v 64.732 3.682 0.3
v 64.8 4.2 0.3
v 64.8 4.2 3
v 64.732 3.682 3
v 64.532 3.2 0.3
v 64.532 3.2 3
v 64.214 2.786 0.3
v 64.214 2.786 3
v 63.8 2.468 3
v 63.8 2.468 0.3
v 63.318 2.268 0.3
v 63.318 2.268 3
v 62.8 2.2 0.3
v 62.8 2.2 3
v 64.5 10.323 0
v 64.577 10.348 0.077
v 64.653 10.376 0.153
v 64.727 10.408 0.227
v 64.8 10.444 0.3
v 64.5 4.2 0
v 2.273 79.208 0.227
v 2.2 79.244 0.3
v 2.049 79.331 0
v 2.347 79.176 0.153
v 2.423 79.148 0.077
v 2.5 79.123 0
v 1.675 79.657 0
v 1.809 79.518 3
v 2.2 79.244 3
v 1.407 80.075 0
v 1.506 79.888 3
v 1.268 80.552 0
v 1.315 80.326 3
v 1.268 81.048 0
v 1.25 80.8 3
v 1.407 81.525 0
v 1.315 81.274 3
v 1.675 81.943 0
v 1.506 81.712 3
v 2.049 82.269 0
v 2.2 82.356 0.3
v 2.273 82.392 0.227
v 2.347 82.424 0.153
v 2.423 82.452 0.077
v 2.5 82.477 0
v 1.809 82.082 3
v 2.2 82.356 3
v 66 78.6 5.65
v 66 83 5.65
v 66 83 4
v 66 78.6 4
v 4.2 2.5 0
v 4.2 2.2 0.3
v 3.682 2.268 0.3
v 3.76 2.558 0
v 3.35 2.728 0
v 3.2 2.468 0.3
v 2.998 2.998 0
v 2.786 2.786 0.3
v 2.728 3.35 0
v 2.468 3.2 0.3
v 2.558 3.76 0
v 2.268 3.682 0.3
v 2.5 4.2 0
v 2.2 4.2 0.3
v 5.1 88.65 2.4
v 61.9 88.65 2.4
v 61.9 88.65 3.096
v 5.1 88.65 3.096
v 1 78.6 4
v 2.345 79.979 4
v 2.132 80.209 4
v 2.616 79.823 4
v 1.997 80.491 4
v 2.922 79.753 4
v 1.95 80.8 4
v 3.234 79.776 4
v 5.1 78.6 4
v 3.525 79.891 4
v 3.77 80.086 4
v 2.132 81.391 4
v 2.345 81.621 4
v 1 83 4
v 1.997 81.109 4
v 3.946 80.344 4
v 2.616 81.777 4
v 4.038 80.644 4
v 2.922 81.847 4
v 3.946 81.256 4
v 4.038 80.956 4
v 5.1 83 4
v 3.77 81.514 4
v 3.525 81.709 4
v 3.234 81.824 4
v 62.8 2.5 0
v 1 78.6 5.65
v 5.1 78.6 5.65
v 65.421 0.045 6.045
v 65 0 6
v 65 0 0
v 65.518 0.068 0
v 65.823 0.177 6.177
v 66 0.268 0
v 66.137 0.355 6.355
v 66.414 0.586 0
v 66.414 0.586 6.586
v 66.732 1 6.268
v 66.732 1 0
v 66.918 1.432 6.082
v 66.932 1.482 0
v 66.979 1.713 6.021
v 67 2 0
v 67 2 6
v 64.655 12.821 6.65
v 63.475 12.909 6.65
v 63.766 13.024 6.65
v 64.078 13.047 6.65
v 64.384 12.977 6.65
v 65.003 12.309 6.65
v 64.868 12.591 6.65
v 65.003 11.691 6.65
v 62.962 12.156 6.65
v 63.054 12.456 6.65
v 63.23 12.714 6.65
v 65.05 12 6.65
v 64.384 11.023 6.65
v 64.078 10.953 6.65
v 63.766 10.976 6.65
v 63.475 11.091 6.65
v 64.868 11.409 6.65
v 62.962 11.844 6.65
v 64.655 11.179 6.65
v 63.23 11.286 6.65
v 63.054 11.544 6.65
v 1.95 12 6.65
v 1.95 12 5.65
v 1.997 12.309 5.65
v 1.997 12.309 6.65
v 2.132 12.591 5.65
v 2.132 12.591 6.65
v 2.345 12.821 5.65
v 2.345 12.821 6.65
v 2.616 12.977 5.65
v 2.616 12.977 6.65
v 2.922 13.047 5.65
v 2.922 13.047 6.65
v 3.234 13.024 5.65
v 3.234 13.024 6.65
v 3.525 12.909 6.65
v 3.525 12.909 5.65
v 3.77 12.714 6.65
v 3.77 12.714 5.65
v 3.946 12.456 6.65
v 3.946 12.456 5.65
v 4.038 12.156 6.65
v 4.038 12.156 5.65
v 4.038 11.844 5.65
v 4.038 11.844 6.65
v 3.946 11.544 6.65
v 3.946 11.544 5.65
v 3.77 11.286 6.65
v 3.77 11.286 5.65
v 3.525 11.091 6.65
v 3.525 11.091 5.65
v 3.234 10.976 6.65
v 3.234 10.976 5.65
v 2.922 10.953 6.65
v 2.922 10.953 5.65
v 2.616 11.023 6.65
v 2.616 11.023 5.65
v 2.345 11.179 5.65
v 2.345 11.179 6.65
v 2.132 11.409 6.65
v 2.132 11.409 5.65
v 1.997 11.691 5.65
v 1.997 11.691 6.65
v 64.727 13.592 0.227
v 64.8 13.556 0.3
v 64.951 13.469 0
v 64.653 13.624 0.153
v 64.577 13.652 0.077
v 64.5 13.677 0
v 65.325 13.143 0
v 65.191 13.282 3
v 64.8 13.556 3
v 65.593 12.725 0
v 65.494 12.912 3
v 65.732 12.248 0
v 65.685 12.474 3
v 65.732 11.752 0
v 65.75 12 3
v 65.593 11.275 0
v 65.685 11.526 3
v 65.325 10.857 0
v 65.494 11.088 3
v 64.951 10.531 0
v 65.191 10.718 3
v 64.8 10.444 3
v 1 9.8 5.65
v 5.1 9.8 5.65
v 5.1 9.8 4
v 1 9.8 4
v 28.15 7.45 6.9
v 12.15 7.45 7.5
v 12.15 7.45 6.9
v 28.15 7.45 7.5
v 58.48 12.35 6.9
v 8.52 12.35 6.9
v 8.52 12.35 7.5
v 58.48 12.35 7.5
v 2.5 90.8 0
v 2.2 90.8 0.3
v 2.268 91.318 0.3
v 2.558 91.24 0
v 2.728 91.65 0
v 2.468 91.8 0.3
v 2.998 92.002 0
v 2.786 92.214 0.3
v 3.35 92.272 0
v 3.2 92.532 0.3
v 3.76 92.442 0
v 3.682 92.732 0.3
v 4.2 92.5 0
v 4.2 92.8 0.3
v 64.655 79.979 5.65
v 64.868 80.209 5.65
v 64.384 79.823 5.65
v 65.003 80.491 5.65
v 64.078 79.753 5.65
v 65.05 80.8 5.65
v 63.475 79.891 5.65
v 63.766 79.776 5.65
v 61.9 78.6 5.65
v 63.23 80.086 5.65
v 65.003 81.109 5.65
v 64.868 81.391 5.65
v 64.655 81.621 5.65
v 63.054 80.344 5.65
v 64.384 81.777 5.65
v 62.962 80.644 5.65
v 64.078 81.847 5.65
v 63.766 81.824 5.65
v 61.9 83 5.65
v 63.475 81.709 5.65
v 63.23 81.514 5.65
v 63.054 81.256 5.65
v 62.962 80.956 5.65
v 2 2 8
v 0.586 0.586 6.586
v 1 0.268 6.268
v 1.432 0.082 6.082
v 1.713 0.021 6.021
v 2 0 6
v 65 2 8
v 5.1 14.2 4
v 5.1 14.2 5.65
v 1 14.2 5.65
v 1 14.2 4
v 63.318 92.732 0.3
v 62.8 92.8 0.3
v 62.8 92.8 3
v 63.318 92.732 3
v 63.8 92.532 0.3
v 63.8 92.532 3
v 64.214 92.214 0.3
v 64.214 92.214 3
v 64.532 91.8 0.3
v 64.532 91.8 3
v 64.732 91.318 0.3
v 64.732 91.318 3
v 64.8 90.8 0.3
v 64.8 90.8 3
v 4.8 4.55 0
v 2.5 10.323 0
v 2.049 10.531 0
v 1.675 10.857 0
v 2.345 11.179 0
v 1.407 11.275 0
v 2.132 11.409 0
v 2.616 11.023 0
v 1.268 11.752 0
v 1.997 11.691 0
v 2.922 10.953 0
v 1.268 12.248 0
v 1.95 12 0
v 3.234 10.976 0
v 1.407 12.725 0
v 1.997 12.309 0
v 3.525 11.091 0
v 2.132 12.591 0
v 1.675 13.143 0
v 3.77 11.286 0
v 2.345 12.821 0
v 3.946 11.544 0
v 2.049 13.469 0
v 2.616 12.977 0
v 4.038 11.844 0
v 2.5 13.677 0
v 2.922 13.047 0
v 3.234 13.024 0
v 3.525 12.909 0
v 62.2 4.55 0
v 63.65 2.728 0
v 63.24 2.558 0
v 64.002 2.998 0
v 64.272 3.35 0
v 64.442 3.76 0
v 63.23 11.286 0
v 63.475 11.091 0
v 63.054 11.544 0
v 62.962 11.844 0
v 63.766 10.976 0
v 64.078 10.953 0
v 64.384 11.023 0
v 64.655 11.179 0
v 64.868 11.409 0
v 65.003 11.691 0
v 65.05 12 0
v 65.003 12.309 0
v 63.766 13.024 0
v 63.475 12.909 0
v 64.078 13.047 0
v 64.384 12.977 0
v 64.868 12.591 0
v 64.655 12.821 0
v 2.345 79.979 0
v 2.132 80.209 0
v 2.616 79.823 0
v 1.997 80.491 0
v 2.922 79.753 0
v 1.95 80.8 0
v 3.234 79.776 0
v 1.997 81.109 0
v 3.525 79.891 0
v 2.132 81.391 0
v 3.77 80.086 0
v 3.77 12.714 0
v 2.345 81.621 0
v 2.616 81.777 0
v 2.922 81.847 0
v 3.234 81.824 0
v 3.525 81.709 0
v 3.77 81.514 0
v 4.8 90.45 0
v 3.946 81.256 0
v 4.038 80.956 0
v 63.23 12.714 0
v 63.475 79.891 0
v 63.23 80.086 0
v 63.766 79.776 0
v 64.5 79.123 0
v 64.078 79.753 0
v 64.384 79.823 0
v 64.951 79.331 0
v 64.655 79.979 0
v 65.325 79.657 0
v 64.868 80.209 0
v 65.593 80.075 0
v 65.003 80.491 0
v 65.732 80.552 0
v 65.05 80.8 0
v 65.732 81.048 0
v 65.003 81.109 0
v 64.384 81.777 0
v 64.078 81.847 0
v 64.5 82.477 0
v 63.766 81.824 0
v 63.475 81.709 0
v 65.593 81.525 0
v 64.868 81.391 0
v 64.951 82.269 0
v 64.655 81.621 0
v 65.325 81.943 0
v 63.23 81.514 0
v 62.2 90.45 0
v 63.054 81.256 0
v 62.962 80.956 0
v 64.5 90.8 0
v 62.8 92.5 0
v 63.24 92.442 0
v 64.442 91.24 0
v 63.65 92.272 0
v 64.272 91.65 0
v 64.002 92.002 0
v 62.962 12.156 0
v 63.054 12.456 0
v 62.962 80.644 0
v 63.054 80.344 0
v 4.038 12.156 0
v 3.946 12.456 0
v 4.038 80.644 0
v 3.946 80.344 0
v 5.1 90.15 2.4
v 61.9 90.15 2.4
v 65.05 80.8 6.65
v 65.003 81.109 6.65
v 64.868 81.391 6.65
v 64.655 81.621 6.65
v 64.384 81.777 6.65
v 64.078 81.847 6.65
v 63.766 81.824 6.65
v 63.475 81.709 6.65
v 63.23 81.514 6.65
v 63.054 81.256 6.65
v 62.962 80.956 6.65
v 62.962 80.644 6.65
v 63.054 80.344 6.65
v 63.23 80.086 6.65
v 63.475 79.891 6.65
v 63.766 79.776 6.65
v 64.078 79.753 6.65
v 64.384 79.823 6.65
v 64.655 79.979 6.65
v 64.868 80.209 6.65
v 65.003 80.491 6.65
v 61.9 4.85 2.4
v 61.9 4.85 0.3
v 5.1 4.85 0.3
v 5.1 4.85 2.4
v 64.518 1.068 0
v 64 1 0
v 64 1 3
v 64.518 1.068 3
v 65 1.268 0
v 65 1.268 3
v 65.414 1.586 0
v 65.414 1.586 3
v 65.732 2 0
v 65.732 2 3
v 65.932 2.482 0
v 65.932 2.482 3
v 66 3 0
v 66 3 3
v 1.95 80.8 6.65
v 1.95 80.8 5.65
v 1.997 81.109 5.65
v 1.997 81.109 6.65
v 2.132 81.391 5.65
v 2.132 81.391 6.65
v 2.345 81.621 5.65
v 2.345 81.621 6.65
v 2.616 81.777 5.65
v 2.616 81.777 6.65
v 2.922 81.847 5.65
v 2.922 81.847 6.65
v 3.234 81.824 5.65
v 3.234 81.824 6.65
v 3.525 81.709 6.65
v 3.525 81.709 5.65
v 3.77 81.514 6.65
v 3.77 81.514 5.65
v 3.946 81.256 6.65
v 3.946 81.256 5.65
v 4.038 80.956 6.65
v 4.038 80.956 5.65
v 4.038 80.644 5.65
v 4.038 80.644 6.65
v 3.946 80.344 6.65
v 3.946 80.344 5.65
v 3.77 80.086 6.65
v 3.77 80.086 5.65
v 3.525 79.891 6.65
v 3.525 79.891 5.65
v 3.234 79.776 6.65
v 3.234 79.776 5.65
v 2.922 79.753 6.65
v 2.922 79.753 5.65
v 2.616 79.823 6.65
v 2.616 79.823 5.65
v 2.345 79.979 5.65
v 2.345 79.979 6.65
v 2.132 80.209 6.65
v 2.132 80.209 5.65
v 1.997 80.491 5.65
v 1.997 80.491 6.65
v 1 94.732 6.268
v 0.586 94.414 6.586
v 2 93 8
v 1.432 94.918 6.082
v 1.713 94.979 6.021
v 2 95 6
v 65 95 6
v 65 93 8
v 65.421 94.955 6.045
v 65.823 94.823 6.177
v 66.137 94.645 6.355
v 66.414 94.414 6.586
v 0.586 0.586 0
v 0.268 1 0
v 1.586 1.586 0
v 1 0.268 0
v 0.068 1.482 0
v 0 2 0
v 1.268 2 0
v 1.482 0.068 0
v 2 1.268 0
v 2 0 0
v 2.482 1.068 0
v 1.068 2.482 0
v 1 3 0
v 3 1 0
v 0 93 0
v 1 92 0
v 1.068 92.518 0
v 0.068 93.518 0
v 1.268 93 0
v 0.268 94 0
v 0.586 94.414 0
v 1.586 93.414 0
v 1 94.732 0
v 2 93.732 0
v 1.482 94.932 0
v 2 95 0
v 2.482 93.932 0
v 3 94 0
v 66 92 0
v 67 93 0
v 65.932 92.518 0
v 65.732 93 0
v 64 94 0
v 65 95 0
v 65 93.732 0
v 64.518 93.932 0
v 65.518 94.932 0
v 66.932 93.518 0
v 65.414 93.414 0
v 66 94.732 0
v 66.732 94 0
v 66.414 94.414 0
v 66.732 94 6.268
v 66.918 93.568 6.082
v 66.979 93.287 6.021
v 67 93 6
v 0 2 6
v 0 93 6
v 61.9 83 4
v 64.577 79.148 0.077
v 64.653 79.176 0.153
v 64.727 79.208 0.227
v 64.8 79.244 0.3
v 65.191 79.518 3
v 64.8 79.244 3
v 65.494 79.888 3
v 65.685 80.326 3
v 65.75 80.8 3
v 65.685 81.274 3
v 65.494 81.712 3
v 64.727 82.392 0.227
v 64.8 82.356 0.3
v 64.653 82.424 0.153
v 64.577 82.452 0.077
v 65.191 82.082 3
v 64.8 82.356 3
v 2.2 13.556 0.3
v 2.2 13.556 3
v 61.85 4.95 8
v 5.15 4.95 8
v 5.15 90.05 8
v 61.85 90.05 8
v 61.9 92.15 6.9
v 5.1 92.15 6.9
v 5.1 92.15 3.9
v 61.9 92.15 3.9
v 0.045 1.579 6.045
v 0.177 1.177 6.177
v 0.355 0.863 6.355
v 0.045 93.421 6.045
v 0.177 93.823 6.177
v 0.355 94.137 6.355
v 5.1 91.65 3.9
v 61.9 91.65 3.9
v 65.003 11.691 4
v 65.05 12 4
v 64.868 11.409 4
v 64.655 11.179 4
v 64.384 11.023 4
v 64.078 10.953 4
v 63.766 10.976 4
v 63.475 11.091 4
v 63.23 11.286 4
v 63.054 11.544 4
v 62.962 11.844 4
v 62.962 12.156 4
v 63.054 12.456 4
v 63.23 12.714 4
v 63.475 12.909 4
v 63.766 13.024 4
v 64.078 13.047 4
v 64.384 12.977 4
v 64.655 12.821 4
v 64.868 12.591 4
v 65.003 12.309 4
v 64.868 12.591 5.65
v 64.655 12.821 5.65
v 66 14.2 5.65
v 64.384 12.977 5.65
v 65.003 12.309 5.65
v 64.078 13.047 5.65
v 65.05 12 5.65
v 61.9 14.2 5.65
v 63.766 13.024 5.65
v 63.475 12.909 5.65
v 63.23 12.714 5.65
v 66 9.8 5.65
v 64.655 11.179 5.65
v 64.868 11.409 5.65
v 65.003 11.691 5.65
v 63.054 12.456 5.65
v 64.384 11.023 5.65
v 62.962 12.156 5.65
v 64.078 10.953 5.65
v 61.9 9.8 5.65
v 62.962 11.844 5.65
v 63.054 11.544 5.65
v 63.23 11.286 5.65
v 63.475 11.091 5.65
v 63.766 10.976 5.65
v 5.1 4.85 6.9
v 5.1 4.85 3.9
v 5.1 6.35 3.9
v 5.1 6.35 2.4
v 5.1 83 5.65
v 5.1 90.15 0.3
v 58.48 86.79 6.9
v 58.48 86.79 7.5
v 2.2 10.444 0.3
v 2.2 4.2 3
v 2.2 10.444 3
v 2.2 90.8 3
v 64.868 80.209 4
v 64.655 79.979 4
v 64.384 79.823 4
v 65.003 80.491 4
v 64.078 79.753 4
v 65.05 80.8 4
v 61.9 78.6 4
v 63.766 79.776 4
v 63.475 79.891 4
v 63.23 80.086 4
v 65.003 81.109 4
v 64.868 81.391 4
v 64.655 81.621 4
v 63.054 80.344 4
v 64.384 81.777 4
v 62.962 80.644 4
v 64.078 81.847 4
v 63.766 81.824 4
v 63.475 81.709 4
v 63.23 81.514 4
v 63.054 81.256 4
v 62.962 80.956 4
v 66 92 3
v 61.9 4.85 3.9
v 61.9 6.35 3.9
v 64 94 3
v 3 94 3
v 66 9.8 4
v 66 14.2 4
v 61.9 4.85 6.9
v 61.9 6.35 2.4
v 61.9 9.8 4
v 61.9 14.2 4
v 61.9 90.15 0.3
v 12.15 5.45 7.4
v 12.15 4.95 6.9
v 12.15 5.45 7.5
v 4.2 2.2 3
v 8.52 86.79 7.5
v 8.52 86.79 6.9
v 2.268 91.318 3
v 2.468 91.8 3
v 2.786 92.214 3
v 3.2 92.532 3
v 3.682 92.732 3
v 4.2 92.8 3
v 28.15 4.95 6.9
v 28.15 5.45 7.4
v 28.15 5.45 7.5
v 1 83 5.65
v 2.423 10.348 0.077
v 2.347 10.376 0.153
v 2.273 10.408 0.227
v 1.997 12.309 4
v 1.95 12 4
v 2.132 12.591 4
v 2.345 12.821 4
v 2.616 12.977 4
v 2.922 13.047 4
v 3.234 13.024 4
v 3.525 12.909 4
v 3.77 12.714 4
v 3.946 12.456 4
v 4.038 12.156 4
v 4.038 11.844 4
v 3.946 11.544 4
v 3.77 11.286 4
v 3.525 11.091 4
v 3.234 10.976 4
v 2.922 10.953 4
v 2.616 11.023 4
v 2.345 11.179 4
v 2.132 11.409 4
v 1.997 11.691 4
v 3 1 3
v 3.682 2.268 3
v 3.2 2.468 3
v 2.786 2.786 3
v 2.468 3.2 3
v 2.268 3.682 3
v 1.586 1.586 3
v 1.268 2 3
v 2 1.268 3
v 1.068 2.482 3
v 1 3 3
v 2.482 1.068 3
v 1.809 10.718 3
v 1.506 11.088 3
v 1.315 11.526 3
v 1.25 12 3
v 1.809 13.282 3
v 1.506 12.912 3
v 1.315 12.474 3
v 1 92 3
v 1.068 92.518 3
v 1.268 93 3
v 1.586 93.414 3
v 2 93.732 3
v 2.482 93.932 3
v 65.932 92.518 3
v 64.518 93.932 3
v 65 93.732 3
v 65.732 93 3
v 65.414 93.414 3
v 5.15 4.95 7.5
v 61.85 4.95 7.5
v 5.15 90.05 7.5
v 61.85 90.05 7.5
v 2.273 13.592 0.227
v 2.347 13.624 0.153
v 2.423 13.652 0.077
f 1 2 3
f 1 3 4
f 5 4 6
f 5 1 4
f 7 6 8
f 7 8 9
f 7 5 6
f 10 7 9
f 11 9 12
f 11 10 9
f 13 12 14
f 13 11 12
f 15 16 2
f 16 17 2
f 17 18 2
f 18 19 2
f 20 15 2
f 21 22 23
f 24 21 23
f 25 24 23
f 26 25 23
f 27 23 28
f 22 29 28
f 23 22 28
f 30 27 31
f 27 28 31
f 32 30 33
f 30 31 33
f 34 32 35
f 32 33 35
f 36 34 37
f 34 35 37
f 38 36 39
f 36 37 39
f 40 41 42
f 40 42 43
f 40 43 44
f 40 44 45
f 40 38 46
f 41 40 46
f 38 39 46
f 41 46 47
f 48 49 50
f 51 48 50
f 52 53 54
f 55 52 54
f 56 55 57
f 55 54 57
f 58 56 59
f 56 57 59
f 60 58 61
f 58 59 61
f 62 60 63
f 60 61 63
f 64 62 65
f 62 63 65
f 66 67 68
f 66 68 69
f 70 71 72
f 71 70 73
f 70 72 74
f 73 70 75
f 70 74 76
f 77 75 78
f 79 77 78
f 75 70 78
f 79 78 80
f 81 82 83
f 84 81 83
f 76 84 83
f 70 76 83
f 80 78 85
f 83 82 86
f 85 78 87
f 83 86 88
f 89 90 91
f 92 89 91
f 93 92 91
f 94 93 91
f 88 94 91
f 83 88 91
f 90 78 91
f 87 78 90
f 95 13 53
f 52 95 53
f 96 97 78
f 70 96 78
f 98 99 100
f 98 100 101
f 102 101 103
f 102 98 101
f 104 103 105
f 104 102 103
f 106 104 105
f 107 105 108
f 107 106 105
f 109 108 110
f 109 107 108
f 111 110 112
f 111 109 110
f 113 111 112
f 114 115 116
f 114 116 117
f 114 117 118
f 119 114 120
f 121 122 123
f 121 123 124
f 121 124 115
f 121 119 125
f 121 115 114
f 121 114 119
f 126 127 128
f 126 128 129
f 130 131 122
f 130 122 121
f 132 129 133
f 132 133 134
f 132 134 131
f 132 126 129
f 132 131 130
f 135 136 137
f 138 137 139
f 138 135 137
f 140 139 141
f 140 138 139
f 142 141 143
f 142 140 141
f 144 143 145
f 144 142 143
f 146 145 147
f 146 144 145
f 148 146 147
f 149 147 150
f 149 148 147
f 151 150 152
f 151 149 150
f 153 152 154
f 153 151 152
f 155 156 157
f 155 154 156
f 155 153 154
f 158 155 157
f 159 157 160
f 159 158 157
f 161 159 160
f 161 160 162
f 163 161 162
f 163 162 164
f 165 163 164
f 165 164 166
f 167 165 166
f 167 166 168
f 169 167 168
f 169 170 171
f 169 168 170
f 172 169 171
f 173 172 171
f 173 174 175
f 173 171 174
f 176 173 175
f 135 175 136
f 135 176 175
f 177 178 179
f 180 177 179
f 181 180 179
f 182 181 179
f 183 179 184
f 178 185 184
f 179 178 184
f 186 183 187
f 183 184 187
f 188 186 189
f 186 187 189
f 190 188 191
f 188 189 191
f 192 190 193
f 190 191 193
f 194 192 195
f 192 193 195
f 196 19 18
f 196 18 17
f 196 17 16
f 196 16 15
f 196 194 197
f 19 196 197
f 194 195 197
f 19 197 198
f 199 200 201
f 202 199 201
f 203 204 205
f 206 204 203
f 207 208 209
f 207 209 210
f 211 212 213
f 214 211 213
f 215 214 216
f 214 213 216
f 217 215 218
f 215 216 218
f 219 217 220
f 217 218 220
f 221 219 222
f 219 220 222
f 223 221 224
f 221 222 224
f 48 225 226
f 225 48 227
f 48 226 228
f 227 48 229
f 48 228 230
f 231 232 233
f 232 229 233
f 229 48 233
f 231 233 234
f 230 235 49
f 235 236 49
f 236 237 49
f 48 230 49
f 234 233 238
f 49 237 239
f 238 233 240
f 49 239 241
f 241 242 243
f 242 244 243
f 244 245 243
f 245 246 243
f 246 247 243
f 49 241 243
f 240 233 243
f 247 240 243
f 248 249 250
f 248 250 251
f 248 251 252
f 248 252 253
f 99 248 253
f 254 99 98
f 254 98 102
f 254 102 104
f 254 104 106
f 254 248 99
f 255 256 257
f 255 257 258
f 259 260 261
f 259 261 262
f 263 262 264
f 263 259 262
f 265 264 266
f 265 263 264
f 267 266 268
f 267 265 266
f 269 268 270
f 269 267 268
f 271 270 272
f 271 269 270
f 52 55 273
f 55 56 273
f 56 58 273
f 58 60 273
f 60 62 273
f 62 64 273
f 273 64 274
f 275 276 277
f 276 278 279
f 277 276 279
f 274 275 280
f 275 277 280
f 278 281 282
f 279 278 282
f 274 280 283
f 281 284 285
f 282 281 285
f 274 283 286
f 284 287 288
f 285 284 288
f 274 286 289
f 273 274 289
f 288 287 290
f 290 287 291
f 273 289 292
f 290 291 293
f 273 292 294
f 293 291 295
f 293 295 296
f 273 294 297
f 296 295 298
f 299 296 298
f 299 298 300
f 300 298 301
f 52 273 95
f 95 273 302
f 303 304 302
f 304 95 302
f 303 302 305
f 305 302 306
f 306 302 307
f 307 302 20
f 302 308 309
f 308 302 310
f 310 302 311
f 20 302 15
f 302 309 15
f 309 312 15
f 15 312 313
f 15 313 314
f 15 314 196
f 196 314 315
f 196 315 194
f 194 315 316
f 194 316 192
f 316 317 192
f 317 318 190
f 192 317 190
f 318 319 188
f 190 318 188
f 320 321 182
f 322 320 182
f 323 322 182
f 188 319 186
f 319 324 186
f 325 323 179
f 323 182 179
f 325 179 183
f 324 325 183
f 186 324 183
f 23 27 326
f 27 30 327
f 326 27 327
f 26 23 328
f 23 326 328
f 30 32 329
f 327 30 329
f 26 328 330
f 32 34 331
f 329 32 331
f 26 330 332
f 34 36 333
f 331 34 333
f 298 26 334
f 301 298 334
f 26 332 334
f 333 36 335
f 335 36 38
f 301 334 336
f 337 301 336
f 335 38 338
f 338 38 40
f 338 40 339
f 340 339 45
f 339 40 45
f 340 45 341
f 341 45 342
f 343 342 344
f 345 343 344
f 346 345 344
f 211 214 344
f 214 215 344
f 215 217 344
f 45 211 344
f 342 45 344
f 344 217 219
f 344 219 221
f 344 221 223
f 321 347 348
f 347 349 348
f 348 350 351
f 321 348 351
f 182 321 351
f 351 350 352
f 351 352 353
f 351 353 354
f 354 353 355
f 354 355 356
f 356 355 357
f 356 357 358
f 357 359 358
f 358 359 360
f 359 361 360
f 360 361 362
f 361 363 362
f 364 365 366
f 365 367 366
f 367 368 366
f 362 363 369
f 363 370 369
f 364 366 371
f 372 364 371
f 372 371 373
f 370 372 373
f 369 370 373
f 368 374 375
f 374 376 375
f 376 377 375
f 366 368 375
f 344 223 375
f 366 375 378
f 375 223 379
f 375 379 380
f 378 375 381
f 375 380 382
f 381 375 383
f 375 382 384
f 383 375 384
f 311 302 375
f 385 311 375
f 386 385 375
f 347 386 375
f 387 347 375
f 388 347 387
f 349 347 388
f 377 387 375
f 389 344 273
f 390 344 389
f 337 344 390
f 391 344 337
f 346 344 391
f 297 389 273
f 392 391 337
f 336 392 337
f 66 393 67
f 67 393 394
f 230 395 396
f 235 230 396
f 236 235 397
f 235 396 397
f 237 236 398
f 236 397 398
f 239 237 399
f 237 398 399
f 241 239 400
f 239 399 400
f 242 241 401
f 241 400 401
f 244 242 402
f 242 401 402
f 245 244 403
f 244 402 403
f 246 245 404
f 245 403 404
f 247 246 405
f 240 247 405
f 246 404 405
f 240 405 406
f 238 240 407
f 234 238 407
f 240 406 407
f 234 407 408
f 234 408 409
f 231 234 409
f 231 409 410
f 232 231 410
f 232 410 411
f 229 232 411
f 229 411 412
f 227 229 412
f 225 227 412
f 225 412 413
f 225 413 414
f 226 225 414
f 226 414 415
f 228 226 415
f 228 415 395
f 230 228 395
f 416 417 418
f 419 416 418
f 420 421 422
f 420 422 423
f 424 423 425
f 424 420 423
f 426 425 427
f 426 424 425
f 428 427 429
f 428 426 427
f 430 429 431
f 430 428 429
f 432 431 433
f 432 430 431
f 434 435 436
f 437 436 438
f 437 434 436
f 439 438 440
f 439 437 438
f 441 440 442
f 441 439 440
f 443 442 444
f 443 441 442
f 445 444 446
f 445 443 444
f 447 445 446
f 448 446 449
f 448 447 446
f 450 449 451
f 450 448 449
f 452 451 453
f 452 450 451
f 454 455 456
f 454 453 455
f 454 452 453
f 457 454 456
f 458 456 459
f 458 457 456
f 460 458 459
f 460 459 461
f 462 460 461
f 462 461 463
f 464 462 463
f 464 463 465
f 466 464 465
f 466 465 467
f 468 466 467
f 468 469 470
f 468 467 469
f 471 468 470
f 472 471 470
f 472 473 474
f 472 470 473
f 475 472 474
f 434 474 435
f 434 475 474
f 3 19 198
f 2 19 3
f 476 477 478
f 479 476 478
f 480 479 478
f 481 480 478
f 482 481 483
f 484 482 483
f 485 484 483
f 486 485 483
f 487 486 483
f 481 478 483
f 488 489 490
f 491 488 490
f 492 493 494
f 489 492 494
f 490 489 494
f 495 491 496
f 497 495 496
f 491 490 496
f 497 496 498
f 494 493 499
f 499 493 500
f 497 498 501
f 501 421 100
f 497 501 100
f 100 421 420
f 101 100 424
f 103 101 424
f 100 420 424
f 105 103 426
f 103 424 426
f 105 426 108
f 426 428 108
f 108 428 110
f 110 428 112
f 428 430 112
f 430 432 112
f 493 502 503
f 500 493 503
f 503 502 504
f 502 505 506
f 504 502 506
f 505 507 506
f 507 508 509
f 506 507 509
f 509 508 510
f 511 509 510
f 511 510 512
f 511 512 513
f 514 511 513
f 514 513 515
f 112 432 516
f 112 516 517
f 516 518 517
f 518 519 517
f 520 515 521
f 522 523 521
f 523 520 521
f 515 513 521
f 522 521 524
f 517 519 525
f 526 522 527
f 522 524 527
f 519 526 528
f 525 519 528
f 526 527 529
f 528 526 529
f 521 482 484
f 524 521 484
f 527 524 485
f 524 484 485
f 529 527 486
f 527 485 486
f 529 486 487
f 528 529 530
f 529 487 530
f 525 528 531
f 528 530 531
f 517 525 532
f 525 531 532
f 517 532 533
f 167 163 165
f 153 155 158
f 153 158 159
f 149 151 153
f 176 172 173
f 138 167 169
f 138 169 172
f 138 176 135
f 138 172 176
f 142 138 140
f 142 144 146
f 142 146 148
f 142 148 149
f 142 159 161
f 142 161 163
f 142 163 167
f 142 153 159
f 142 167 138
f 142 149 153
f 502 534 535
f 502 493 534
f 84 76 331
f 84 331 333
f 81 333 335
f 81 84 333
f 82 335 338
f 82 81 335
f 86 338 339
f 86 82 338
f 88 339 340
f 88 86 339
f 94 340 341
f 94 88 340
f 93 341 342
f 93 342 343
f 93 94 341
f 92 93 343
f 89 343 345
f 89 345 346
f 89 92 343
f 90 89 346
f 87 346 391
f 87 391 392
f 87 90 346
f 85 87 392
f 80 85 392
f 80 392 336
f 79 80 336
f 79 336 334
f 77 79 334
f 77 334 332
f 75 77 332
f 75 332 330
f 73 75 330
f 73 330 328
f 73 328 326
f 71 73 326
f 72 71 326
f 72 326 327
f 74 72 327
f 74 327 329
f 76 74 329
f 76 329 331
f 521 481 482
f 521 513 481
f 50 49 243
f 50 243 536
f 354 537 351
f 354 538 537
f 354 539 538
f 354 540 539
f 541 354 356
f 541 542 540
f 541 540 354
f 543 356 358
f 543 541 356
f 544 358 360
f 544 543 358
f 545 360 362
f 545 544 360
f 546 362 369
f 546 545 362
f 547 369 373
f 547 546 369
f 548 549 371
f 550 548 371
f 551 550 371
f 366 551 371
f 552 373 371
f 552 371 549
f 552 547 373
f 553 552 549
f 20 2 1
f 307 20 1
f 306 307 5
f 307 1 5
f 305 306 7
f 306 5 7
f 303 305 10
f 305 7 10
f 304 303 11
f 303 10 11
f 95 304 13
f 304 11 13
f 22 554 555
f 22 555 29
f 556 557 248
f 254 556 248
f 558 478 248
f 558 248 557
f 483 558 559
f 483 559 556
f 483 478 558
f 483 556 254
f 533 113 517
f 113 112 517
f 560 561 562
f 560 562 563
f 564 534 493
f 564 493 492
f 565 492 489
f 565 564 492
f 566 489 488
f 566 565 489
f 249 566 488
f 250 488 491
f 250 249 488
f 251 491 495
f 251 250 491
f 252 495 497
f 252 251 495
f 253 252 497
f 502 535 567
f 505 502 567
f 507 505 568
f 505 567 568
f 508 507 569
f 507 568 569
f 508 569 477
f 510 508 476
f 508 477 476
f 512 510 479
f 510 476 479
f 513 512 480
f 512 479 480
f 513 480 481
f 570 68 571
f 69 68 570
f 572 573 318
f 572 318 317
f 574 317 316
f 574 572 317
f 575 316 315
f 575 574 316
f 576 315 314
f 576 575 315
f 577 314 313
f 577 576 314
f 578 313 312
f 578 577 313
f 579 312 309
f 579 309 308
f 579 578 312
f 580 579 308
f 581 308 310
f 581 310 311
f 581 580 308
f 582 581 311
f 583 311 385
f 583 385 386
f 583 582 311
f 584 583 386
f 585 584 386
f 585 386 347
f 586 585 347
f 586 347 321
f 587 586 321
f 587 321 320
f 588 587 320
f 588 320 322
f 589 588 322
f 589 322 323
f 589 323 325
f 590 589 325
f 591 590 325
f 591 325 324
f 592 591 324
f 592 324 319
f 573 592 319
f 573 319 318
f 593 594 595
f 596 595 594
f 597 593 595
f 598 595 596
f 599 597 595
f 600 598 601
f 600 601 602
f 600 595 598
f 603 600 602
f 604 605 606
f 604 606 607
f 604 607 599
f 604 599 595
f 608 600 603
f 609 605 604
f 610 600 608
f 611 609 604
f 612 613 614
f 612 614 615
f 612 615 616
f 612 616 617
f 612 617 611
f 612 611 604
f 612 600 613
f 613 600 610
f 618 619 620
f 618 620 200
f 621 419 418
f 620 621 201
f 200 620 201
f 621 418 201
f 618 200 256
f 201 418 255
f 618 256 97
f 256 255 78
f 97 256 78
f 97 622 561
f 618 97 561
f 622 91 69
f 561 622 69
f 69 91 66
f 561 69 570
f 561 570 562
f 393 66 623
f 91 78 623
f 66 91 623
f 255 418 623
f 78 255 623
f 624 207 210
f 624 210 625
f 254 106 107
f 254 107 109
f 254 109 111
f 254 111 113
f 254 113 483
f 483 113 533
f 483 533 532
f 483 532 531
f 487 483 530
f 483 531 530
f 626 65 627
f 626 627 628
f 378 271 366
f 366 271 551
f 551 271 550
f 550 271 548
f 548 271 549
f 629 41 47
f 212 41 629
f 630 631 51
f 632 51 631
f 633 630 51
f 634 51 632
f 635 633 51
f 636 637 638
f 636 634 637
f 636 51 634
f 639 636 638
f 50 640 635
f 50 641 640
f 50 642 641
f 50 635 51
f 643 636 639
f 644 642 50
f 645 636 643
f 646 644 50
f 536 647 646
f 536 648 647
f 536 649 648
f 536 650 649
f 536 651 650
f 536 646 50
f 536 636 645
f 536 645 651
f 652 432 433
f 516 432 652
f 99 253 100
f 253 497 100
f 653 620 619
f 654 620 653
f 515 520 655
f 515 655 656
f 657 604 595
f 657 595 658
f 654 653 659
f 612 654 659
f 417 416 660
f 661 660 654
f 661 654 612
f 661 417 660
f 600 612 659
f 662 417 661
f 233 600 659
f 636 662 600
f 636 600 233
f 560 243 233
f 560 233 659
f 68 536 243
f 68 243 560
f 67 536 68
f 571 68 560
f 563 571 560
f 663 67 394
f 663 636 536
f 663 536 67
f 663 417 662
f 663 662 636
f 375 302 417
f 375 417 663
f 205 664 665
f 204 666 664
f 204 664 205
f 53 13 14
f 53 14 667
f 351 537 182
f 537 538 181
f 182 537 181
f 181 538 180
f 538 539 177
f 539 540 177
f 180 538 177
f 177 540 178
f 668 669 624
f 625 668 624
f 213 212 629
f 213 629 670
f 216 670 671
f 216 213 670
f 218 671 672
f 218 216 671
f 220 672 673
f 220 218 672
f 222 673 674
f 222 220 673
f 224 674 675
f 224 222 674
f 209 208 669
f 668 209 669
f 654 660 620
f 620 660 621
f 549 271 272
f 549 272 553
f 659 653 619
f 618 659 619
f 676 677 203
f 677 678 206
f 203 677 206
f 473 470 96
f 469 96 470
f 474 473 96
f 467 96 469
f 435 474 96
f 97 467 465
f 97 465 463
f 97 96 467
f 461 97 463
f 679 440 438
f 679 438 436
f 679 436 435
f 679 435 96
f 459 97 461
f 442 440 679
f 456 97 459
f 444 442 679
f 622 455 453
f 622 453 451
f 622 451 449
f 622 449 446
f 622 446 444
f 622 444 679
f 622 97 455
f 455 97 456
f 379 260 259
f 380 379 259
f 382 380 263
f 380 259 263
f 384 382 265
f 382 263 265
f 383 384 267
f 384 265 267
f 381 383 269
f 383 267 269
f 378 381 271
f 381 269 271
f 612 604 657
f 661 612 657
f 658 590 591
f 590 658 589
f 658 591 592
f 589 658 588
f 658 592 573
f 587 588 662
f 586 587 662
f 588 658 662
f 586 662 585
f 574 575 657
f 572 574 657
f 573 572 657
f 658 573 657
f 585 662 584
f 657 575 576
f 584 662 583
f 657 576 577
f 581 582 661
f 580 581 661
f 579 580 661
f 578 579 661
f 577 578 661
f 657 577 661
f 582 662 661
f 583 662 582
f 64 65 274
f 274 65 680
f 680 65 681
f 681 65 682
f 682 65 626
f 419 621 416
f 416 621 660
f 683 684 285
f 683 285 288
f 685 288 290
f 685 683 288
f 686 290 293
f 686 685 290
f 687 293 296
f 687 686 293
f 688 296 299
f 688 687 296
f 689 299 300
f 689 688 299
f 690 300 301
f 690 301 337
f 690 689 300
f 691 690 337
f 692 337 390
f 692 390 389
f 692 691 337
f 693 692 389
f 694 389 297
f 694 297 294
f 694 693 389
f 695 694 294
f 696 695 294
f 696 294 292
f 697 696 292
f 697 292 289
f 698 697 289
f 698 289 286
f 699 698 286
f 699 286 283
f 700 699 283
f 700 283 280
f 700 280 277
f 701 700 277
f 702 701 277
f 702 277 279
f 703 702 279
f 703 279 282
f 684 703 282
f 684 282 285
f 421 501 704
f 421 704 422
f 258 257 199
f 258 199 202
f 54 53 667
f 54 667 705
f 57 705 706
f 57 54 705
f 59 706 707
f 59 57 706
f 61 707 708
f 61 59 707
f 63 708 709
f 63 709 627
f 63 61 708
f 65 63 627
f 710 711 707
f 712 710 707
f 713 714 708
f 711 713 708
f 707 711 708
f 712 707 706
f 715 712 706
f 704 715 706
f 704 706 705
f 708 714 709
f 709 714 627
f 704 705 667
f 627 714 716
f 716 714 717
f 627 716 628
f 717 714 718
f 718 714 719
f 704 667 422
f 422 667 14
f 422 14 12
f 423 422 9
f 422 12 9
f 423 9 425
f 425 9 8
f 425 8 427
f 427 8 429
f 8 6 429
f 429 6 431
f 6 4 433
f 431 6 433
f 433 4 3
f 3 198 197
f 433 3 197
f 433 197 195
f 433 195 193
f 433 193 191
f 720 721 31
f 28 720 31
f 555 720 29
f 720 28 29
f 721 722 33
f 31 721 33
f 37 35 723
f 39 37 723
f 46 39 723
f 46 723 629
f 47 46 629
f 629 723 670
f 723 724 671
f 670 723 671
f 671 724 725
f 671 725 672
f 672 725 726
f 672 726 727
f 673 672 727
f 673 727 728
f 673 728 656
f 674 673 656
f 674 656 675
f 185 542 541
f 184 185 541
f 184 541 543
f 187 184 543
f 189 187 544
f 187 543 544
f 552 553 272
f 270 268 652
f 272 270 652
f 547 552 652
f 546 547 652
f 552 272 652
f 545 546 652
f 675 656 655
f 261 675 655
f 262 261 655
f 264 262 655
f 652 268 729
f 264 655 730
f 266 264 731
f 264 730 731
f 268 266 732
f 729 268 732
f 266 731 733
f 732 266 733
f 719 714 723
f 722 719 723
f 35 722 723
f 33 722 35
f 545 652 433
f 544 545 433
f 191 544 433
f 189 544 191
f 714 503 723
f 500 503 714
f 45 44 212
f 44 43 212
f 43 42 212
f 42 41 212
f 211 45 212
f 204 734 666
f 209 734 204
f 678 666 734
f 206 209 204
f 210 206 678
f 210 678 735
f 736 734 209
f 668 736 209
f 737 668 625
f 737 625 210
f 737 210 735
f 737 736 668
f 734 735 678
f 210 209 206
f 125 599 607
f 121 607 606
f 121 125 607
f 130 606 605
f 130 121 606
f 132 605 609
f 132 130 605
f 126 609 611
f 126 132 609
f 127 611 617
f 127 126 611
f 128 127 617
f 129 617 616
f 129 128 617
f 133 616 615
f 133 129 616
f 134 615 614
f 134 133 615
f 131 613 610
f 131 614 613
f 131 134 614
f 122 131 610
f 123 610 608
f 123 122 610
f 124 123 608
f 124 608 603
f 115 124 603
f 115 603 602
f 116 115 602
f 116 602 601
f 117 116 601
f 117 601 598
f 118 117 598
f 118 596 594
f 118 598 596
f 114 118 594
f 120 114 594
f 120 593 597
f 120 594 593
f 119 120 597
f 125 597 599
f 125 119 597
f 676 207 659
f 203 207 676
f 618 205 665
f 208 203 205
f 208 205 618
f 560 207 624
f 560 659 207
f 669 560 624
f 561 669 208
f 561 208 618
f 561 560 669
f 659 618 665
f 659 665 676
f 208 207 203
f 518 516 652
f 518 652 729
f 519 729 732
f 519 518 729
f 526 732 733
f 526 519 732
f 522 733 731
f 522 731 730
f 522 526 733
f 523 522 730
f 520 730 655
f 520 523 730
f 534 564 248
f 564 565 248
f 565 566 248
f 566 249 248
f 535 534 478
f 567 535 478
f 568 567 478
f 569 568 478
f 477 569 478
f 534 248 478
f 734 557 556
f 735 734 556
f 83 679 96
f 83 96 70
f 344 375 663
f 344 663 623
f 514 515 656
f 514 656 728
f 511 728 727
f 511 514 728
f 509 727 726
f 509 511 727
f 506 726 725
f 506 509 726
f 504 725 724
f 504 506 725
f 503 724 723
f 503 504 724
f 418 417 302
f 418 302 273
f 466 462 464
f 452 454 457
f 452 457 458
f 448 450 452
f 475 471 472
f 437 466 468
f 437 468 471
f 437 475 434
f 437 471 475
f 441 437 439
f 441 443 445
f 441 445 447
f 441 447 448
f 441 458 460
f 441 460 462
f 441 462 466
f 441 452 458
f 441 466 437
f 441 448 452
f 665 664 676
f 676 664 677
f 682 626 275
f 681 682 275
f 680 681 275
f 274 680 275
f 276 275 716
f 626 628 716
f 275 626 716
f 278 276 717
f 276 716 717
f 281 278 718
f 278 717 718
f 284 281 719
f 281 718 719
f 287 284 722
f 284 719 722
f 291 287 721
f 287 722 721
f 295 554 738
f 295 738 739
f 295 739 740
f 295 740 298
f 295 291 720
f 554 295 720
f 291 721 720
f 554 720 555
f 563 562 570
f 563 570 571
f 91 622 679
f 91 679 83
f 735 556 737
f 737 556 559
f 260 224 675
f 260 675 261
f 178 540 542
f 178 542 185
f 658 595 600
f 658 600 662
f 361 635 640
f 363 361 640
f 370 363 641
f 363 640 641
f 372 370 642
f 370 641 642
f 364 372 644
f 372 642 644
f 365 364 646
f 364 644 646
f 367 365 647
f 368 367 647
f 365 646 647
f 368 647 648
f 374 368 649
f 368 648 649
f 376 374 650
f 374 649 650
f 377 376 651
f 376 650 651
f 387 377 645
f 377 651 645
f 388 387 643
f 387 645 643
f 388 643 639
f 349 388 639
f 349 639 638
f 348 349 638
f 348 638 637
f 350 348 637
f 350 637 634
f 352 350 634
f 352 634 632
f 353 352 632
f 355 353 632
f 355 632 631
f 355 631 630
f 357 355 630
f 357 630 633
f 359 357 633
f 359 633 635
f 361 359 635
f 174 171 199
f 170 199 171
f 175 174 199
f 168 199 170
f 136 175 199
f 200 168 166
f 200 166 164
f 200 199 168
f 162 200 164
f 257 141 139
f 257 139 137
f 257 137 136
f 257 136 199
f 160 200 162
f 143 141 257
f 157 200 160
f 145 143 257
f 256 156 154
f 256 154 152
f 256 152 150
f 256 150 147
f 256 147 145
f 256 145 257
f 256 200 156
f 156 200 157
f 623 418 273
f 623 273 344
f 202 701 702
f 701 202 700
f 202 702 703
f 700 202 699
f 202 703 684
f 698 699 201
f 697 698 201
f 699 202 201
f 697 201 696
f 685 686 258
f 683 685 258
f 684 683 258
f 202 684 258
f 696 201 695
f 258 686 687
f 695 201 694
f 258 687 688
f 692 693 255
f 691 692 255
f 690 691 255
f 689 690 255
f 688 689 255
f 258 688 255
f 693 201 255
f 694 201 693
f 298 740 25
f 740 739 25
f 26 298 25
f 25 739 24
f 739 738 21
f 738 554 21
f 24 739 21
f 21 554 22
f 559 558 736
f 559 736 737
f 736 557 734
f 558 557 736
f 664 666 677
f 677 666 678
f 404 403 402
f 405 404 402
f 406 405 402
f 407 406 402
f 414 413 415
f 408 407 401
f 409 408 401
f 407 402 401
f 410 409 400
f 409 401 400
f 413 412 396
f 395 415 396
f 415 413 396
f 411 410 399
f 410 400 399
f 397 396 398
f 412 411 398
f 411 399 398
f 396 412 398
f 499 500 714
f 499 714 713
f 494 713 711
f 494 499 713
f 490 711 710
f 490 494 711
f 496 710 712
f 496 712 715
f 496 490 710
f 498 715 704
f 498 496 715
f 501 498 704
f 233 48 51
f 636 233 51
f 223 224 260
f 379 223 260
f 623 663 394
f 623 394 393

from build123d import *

# Parameters (mm, degrees)
SKIZZE1_W                        = 67
SKIZZE1_H                        = 95
AUFSATZ_LINEAR_AUSTRAGEN1_DEPTH  = 8
SKIZZE2_W                        = 56.7
SKIZZE2_H                        = 85.1
SCHNITT_LINEAR_AUSTRAGEN1_DEPTH  = 0.5
SCHNITT_LINEAR_START             = -7.5
SKIZZE3_W                        = 49.96
SKIZZE3_H                        = 74.44
SCHNITT_LINEAR_AUSTRAGEN2_DEPTH  = 7.5
SCHNITT_LINEAR_AUSTRAGEN3_REACH  = 9.5
SKIZZE4_W                        = 16
SKIZZE4_H                        = 2
SKIZZE5_W                        = 56.8
SKIZZE5_H                        = 85.3
SCHNITT_LINEAR_AUSTRAGEN4_DEPTH  = 6.9
FASE1_SIZE                       = 2
FASE2_SIZE                       = 0.5
SKIZZE8_W                        = 56.8
SKIZZE8_H                        = 3
SCHNITT_LINEAR_AUSTRAGEN5_DEPTH  = 2
SKIZZE10_W                       = 56.8
SKIZZE10_H                       = 1.5
AUFSATZ_LINEAR_AUSTRAGEN2_DEPTH  = 85.3
SCHNITT_LINEAR_AUSTRAGEN6_REACH  = 7.6
SKIZZE12_W                       = 56.8
SKIZZE12_H                       = 82.3
VERRUNDUNG2_R                    = 2
FASE3_SIZE                       = 3
FASE3_SIZE2                      = 0.803847577
SCHNITT_LINEAR_AUSTRAGEN9_DEPTH  = 3
FASE8_SIZE                       = 0.3
SKIZZE18_W                       = 1.65
SKIZZE18_H                       = 4.4
SCHNITT_LINEAR_AUSTRAGEN10_DEPTH = 4.1
AUFSATZ_LINEAR_START             = 1.65
SKIZZE20_R                       = 1.75
AUFSATZ_LINEAR_AUSTRAGEN7_DEPTH  = 4
SCHNITT_LINEAR_START_2           = -1
SKIZZE21_R                       = 1.05
SCHNITT_LINEAR_AUSTRAGEN12_DEPTH = 6.65
LINEARES_MUSTER1_COUNT           = 2
LINEARES_MUSTER1_PITCH           = 68.8
LINEARES_START                   = 1.65
LINEARES_MUSTER1_COPY_1_SKETCH_R = 1.75
LINEARES_MUSTER1_COPY_1_DEPTH    = 4
LINEARES_START_2                 = -1
LINEARES_MUSTER1_COPY_2_SKETCH_R = 1.05
LINEARES_MUSTER1_COPY_2_DEPTH    = 6.65
LINEARES_MUSTER1_COPY_3_SKETCH_W = 1.65
LINEARES_MUSTER1_COPY_3_SKETCH_H = 4.4
LINEARES_MUSTER1_COPY_3_DEPTH    = 4.1


with BuildPart() as part:
    # Skizze1 → Aufsatz-Linear austragen1 (new body)
    with BuildSketch(Plane.XY):
        with Locations((33.5, 47.5)):
            Rectangle(SKIZZE1_W, SKIZZE1_H)
    extrude(amount=AUFSATZ_LINEAR_AUSTRAGEN1_DEPTH)

    # Skizze2 → Schnitt-Linear austragen1 (cut)
    with BuildSketch(Plane.XY.offset(8)):
        with Locations((33.5, 47.5)):
            Rectangle(SKIZZE2_W, SKIZZE2_H)
    extrude(amount=-SCHNITT_LINEAR_AUSTRAGEN1_DEPTH, mode=Mode.SUBTRACT)

    # Skizze3 → Schnitt-Linear austragen2 (cut)
    with BuildSketch(Plane.XY.offset(7.5).offset(SCHNITT_LINEAR_START)):
        with Locations((33.5, 49.57)):
            Rectangle(SKIZZE3_W, SKIZZE3_H)
    extrude(amount=SCHNITT_LINEAR_AUSTRAGEN2_DEPTH, mode=Mode.SUBTRACT)

    # Skizze4 → Schnitt-Linear austragen3 (cut, up to next)
    with BuildSketch(Plane.XY.offset(7.5), mode=Mode.PRIVATE) as schnitt_linear_austragen3_sk1:
        with Locations((20.15, 6.45)):
            Rectangle(SKIZZE4_W, SKIZZE4_H)
    schnitt_linear_austragen3_tool1 = extrude(schnitt_linear_austragen3_sk1.sketch, amount=-SCHNITT_LINEAR_AUSTRAGEN3_REACH, mode=Mode.PRIVATE) & part.part
    add(schnitt_linear_austragen3_tool1.solids().sort_by_distance((20.15, 6.45, 7.5))[0], mode=Mode.SUBTRACT)

    # Skizze5 → Schnitt-Linear austragen4 (cut)
    with BuildSketch(Plane(origin=(0, 0, 0), x_dir=(-1, 0, 0), z_dir=(0, 0, -1))):
        with Locations((-33.5, 47.5)):
            Rectangle(SKIZZE5_W, SKIZZE5_H)
    extrude(amount=-SCHNITT_LINEAR_AUSTRAGEN4_DEPTH, mode=Mode.SUBTRACT)

    # Fase1
    fase1_edges = [part.edges().sort_by_distance(p)[0] for p in [
        (67, 47.5, 8),
        (33.5, 95, 8),
        (0, 47.5, 8),
        (33.5, 0, 8),
    ]]
    chamfer(fase1_edges, length=FASE1_SIZE)

    # Fase2
    fase2_edges = [part.edges().sort_by_distance(p)[0] for p in [
        (20.15, 5.45, 6.9),
    ]]
    chamfer(fase2_edges, length=FASE2_SIZE)

    # Skizze8 → Schnitt-Linear austragen5 (cut)
    with BuildSketch(Plane.XZ.offset(-90.15)):
        with Locations((33.5, 5.4)):
            Rectangle(SKIZZE8_W, SKIZZE8_H)
    extrude(amount=-SCHNITT_LINEAR_AUSTRAGEN5_DEPTH, mode=Mode.SUBTRACT)

    # Skizze10 → Aufsatz-Linear austragen2 (add)
    with BuildSketch(Plane.XZ.offset(-90.15)):
        with Locations((33.5, 3.15)):
            Rectangle(SKIZZE10_W, SKIZZE10_H)
    extrude(amount=AUFSATZ_LINEAR_AUSTRAGEN2_DEPTH)

    # Skizze12 → Schnitt-Linear austragen6 (cut, up to next)
    with BuildSketch(Plane(origin=(0, 0, 2.4), x_dir=(-1, 0, 0), z_dir=(0, 0, -1)), mode=Mode.PRIVATE) as schnitt_linear_austragen6_sk1:
        with Locations((-33.5, 47.5)):
            Rectangle(SKIZZE12_W, SKIZZE12_H)
    schnitt_linear_austragen6_tool1 = extrude(schnitt_linear_austragen6_sk1.sketch, amount=-SCHNITT_LINEAR_AUSTRAGEN6_REACH, mode=Mode.PRIVATE) & part.part
    add(schnitt_linear_austragen6_tool1.solids().sort_by_distance((33.5, 47.5, 2.4))[0], mode=Mode.SUBTRACT)

    # Verrundung2
    verrundung2_edges = [part.edges().sort_by_distance(p)[0] for p in [
        (0, 0, 3),
        (0, 95, 3),
        (67, 0, 3),
        (67, 95, 3),
    ]]
    fillet(verrundung2_edges, radius=VERRUNDUNG2_R)

    # Fase3
    fase3_edges = [part.edges().sort_by_distance(p)[0] for p in [
        (33.5, 88.65, 3.9),
    ]]
    fase3_side = [part.faces().sort_by_distance(p)[0] for p in [
        (33.5, 90.4, 3.9),
    ]]
    chamfer(fase3_edges, length=FASE3_SIZE, length2=FASE3_SIZE2, reference=fase3_side[0])

    # Skizze14 → Schnitt-Linear austragen9 (cut)
    with BuildSketch(Plane(origin=(0, 0, 0), x_dir=(-1, 0, 0), z_dir=(0, 0, -1))):
        with BuildLine():
            Line((-64, 94), (-3, 94))
            ThreePointArc((-3, 94), (-1.585786438, 93.414213562), (-1, 92))
            Line((-1, 92), (-1, 3))
            ThreePointArc((-1, 3), (-1.585786438, 1.585786438), (-3, 1))
            Line((-3, 1), (-64, 1))
            ThreePointArc((-64, 1), (-65.414213562, 1.585786438), (-66, 3))
            Line((-66, 3), (-66, 92))
            ThreePointArc((-66, 92), (-65.414213562, 93.414213562), (-64, 94))
        make_face()
        with BuildLine():
            ThreePointArc((-64.8, 4.2), (-64.214213562, 2.785786438), (-62.8, 2.2))
            Line((-62.8, 2.2), (-4.2, 2.2))
            ThreePointArc((-4.2, 2.2), (-2.785786438, 2.785786438), (-2.2, 4.2))
            Line((-2.2, 4.2), (-2.2, 90.8))
            ThreePointArc((-2.2, 90.8), (-2.785786438, 92.214213562), (-4.2, 92.8))
            Line((-4.2, 92.8), (-62.8, 92.8))
            ThreePointArc((-62.8, 92.8), (-64.214213562, 92.214213562), (-64.8, 90.8))
            Line((-64.8, 90.8), (-64.8, 4.2))
        make_face(mode=Mode.SUBTRACT)
    extrude(amount=-SCHNITT_LINEAR_AUSTRAGEN9_DEPTH, mode=Mode.SUBTRACT)

    # Fase8
    fase8_edges = [part.edges().sort_by_distance(p)[0] for p in [
        (64.214213562, 2.785786438, 0),
        (33.5, 2.2, 0),
        (2.2, 47.5, 0),
        (2.785786438, 92.214213562, 0),
        (64.214213562, 92.214213562, 0),
        (64.8, 47.5, 0),
        (33.5, 92.8, 0),
        (2.785786438, 2.785786438, 0),
        (61.9, 47.5, 0),
        (33.5, 4.85, 0),
        (5.1, 47.5, 0),
        (33.5, 90.15, 0),
    ]]
    chamfer(fase8_edges, length=FASE8_SIZE)

    # Skizze18 → Schnitt-Linear austragen10 (cut)
    with BuildSketch(Plane(origin=(5.1, 0, 0), x_dir=(0, 0, -1), z_dir=(1, 0, 0))):
        with Locations((-4.825, 80.8)):
            Rectangle(SKIZZE18_W, SKIZZE18_H)
    schnitt_linear_austragen10 = extrude(amount=-SCHNITT_LINEAR_AUSTRAGEN10_DEPTH, mode=Mode.SUBTRACT)

    # Spiegeln6: Schnitt-Linear austragen10 across plane
    add(schnitt_linear_austragen10.mirror(Plane.ZY.offset(-33.5)), mode=Mode.SUBTRACT)

    # Skizze20 → Aufsatz-Linear austragen7 (add)
    with BuildSketch(Plane(origin=(0, 0, 5.65), x_dir=(-1, 0, 0), z_dir=(0, 0, -1)).offset(AUFSATZ_LINEAR_START)):
        with Locations((-3, 80.8)):
            Circle(SKIZZE20_R)
    aufsatz_linear_austragen7 = extrude(amount=AUFSATZ_LINEAR_AUSTRAGEN7_DEPTH)

    # Skizze21 → Schnitt-Linear austragen12 (cut)
    with BuildSketch(Plane(origin=(0, 0, 5.65), x_dir=(-1, 0, 0), z_dir=(0, 0, -1)).offset(SCHNITT_LINEAR_START_2)):
        with Locations((-3, 80.8)):
            Circle(SKIZZE21_R)
    schnitt_linear_austragen12 = extrude(amount=SCHNITT_LINEAR_AUSTRAGEN12_DEPTH, mode=Mode.SUBTRACT)

    # Spiegeln1: Aufsatz-Linear austragen7, Schnitt-Linear austragen12 across plane
    add(aufsatz_linear_austragen7.mirror(Plane.ZY.offset(-33.5)))
    add(schnitt_linear_austragen12.mirror(Plane.ZY.offset(-33.5)), mode=Mode.SUBTRACT)

    # Lineares Muster1: Schnitt-Linear austragen10, Aufsatz-Linear austragen7, Schnitt-Linear austragen12 ×2
    with Locations(*[(0, -i * LINEARES_MUSTER1_PITCH, 0) for i in range(1, LINEARES_MUSTER1_COUNT)]):
        add(schnitt_linear_austragen10, mode=Mode.SUBTRACT)
        add(aufsatz_linear_austragen7)
        add(schnitt_linear_austragen12, mode=Mode.SUBTRACT)

    # Lineares Muster1 copy 1 sketch → Lineares Muster1 copy 1 (add)
    with BuildSketch(Plane(origin=(67, -68.8, 5.65), x_dir=(1, 0, 0), z_dir=(0, 0, -1)).offset(LINEARES_START)):
        with Locations((-3, -80.8)):
            Circle(LINEARES_MUSTER1_COPY_1_SKETCH_R)
    extrude(amount=LINEARES_MUSTER1_COPY_1_DEPTH)

    # Lineares Muster1 copy 2 sketch → Lineares Muster1 copy 2 (cut)
    with BuildSketch(Plane(origin=(67, -68.8, 5.65), x_dir=(1, 0, 0), z_dir=(0, 0, -1)).offset(LINEARES_START_2)):
        with Locations((-3, -80.8)):
            Circle(LINEARES_MUSTER1_COPY_2_SKETCH_R)
    extrude(amount=LINEARES_MUSTER1_COPY_2_DEPTH, mode=Mode.SUBTRACT)

    # Lineares Muster1 copy 3 sketch → Lineares Muster1 copy 3 (cut)
    with BuildSketch(Plane(origin=(61.9, -68.8, 0), x_dir=(0, 0, -1), z_dir=(-1, 0, 0))):
        with Locations((-4.825, -80.8)):
            Rectangle(LINEARES_MUSTER1_COPY_3_SKETCH_W, LINEARES_MUSTER1_COPY_3_SKETCH_H)
    extrude(amount=-LINEARES_MUSTER1_COPY_3_DEPTH, mode=Mode.SUBTRACT)


solid = part.part
